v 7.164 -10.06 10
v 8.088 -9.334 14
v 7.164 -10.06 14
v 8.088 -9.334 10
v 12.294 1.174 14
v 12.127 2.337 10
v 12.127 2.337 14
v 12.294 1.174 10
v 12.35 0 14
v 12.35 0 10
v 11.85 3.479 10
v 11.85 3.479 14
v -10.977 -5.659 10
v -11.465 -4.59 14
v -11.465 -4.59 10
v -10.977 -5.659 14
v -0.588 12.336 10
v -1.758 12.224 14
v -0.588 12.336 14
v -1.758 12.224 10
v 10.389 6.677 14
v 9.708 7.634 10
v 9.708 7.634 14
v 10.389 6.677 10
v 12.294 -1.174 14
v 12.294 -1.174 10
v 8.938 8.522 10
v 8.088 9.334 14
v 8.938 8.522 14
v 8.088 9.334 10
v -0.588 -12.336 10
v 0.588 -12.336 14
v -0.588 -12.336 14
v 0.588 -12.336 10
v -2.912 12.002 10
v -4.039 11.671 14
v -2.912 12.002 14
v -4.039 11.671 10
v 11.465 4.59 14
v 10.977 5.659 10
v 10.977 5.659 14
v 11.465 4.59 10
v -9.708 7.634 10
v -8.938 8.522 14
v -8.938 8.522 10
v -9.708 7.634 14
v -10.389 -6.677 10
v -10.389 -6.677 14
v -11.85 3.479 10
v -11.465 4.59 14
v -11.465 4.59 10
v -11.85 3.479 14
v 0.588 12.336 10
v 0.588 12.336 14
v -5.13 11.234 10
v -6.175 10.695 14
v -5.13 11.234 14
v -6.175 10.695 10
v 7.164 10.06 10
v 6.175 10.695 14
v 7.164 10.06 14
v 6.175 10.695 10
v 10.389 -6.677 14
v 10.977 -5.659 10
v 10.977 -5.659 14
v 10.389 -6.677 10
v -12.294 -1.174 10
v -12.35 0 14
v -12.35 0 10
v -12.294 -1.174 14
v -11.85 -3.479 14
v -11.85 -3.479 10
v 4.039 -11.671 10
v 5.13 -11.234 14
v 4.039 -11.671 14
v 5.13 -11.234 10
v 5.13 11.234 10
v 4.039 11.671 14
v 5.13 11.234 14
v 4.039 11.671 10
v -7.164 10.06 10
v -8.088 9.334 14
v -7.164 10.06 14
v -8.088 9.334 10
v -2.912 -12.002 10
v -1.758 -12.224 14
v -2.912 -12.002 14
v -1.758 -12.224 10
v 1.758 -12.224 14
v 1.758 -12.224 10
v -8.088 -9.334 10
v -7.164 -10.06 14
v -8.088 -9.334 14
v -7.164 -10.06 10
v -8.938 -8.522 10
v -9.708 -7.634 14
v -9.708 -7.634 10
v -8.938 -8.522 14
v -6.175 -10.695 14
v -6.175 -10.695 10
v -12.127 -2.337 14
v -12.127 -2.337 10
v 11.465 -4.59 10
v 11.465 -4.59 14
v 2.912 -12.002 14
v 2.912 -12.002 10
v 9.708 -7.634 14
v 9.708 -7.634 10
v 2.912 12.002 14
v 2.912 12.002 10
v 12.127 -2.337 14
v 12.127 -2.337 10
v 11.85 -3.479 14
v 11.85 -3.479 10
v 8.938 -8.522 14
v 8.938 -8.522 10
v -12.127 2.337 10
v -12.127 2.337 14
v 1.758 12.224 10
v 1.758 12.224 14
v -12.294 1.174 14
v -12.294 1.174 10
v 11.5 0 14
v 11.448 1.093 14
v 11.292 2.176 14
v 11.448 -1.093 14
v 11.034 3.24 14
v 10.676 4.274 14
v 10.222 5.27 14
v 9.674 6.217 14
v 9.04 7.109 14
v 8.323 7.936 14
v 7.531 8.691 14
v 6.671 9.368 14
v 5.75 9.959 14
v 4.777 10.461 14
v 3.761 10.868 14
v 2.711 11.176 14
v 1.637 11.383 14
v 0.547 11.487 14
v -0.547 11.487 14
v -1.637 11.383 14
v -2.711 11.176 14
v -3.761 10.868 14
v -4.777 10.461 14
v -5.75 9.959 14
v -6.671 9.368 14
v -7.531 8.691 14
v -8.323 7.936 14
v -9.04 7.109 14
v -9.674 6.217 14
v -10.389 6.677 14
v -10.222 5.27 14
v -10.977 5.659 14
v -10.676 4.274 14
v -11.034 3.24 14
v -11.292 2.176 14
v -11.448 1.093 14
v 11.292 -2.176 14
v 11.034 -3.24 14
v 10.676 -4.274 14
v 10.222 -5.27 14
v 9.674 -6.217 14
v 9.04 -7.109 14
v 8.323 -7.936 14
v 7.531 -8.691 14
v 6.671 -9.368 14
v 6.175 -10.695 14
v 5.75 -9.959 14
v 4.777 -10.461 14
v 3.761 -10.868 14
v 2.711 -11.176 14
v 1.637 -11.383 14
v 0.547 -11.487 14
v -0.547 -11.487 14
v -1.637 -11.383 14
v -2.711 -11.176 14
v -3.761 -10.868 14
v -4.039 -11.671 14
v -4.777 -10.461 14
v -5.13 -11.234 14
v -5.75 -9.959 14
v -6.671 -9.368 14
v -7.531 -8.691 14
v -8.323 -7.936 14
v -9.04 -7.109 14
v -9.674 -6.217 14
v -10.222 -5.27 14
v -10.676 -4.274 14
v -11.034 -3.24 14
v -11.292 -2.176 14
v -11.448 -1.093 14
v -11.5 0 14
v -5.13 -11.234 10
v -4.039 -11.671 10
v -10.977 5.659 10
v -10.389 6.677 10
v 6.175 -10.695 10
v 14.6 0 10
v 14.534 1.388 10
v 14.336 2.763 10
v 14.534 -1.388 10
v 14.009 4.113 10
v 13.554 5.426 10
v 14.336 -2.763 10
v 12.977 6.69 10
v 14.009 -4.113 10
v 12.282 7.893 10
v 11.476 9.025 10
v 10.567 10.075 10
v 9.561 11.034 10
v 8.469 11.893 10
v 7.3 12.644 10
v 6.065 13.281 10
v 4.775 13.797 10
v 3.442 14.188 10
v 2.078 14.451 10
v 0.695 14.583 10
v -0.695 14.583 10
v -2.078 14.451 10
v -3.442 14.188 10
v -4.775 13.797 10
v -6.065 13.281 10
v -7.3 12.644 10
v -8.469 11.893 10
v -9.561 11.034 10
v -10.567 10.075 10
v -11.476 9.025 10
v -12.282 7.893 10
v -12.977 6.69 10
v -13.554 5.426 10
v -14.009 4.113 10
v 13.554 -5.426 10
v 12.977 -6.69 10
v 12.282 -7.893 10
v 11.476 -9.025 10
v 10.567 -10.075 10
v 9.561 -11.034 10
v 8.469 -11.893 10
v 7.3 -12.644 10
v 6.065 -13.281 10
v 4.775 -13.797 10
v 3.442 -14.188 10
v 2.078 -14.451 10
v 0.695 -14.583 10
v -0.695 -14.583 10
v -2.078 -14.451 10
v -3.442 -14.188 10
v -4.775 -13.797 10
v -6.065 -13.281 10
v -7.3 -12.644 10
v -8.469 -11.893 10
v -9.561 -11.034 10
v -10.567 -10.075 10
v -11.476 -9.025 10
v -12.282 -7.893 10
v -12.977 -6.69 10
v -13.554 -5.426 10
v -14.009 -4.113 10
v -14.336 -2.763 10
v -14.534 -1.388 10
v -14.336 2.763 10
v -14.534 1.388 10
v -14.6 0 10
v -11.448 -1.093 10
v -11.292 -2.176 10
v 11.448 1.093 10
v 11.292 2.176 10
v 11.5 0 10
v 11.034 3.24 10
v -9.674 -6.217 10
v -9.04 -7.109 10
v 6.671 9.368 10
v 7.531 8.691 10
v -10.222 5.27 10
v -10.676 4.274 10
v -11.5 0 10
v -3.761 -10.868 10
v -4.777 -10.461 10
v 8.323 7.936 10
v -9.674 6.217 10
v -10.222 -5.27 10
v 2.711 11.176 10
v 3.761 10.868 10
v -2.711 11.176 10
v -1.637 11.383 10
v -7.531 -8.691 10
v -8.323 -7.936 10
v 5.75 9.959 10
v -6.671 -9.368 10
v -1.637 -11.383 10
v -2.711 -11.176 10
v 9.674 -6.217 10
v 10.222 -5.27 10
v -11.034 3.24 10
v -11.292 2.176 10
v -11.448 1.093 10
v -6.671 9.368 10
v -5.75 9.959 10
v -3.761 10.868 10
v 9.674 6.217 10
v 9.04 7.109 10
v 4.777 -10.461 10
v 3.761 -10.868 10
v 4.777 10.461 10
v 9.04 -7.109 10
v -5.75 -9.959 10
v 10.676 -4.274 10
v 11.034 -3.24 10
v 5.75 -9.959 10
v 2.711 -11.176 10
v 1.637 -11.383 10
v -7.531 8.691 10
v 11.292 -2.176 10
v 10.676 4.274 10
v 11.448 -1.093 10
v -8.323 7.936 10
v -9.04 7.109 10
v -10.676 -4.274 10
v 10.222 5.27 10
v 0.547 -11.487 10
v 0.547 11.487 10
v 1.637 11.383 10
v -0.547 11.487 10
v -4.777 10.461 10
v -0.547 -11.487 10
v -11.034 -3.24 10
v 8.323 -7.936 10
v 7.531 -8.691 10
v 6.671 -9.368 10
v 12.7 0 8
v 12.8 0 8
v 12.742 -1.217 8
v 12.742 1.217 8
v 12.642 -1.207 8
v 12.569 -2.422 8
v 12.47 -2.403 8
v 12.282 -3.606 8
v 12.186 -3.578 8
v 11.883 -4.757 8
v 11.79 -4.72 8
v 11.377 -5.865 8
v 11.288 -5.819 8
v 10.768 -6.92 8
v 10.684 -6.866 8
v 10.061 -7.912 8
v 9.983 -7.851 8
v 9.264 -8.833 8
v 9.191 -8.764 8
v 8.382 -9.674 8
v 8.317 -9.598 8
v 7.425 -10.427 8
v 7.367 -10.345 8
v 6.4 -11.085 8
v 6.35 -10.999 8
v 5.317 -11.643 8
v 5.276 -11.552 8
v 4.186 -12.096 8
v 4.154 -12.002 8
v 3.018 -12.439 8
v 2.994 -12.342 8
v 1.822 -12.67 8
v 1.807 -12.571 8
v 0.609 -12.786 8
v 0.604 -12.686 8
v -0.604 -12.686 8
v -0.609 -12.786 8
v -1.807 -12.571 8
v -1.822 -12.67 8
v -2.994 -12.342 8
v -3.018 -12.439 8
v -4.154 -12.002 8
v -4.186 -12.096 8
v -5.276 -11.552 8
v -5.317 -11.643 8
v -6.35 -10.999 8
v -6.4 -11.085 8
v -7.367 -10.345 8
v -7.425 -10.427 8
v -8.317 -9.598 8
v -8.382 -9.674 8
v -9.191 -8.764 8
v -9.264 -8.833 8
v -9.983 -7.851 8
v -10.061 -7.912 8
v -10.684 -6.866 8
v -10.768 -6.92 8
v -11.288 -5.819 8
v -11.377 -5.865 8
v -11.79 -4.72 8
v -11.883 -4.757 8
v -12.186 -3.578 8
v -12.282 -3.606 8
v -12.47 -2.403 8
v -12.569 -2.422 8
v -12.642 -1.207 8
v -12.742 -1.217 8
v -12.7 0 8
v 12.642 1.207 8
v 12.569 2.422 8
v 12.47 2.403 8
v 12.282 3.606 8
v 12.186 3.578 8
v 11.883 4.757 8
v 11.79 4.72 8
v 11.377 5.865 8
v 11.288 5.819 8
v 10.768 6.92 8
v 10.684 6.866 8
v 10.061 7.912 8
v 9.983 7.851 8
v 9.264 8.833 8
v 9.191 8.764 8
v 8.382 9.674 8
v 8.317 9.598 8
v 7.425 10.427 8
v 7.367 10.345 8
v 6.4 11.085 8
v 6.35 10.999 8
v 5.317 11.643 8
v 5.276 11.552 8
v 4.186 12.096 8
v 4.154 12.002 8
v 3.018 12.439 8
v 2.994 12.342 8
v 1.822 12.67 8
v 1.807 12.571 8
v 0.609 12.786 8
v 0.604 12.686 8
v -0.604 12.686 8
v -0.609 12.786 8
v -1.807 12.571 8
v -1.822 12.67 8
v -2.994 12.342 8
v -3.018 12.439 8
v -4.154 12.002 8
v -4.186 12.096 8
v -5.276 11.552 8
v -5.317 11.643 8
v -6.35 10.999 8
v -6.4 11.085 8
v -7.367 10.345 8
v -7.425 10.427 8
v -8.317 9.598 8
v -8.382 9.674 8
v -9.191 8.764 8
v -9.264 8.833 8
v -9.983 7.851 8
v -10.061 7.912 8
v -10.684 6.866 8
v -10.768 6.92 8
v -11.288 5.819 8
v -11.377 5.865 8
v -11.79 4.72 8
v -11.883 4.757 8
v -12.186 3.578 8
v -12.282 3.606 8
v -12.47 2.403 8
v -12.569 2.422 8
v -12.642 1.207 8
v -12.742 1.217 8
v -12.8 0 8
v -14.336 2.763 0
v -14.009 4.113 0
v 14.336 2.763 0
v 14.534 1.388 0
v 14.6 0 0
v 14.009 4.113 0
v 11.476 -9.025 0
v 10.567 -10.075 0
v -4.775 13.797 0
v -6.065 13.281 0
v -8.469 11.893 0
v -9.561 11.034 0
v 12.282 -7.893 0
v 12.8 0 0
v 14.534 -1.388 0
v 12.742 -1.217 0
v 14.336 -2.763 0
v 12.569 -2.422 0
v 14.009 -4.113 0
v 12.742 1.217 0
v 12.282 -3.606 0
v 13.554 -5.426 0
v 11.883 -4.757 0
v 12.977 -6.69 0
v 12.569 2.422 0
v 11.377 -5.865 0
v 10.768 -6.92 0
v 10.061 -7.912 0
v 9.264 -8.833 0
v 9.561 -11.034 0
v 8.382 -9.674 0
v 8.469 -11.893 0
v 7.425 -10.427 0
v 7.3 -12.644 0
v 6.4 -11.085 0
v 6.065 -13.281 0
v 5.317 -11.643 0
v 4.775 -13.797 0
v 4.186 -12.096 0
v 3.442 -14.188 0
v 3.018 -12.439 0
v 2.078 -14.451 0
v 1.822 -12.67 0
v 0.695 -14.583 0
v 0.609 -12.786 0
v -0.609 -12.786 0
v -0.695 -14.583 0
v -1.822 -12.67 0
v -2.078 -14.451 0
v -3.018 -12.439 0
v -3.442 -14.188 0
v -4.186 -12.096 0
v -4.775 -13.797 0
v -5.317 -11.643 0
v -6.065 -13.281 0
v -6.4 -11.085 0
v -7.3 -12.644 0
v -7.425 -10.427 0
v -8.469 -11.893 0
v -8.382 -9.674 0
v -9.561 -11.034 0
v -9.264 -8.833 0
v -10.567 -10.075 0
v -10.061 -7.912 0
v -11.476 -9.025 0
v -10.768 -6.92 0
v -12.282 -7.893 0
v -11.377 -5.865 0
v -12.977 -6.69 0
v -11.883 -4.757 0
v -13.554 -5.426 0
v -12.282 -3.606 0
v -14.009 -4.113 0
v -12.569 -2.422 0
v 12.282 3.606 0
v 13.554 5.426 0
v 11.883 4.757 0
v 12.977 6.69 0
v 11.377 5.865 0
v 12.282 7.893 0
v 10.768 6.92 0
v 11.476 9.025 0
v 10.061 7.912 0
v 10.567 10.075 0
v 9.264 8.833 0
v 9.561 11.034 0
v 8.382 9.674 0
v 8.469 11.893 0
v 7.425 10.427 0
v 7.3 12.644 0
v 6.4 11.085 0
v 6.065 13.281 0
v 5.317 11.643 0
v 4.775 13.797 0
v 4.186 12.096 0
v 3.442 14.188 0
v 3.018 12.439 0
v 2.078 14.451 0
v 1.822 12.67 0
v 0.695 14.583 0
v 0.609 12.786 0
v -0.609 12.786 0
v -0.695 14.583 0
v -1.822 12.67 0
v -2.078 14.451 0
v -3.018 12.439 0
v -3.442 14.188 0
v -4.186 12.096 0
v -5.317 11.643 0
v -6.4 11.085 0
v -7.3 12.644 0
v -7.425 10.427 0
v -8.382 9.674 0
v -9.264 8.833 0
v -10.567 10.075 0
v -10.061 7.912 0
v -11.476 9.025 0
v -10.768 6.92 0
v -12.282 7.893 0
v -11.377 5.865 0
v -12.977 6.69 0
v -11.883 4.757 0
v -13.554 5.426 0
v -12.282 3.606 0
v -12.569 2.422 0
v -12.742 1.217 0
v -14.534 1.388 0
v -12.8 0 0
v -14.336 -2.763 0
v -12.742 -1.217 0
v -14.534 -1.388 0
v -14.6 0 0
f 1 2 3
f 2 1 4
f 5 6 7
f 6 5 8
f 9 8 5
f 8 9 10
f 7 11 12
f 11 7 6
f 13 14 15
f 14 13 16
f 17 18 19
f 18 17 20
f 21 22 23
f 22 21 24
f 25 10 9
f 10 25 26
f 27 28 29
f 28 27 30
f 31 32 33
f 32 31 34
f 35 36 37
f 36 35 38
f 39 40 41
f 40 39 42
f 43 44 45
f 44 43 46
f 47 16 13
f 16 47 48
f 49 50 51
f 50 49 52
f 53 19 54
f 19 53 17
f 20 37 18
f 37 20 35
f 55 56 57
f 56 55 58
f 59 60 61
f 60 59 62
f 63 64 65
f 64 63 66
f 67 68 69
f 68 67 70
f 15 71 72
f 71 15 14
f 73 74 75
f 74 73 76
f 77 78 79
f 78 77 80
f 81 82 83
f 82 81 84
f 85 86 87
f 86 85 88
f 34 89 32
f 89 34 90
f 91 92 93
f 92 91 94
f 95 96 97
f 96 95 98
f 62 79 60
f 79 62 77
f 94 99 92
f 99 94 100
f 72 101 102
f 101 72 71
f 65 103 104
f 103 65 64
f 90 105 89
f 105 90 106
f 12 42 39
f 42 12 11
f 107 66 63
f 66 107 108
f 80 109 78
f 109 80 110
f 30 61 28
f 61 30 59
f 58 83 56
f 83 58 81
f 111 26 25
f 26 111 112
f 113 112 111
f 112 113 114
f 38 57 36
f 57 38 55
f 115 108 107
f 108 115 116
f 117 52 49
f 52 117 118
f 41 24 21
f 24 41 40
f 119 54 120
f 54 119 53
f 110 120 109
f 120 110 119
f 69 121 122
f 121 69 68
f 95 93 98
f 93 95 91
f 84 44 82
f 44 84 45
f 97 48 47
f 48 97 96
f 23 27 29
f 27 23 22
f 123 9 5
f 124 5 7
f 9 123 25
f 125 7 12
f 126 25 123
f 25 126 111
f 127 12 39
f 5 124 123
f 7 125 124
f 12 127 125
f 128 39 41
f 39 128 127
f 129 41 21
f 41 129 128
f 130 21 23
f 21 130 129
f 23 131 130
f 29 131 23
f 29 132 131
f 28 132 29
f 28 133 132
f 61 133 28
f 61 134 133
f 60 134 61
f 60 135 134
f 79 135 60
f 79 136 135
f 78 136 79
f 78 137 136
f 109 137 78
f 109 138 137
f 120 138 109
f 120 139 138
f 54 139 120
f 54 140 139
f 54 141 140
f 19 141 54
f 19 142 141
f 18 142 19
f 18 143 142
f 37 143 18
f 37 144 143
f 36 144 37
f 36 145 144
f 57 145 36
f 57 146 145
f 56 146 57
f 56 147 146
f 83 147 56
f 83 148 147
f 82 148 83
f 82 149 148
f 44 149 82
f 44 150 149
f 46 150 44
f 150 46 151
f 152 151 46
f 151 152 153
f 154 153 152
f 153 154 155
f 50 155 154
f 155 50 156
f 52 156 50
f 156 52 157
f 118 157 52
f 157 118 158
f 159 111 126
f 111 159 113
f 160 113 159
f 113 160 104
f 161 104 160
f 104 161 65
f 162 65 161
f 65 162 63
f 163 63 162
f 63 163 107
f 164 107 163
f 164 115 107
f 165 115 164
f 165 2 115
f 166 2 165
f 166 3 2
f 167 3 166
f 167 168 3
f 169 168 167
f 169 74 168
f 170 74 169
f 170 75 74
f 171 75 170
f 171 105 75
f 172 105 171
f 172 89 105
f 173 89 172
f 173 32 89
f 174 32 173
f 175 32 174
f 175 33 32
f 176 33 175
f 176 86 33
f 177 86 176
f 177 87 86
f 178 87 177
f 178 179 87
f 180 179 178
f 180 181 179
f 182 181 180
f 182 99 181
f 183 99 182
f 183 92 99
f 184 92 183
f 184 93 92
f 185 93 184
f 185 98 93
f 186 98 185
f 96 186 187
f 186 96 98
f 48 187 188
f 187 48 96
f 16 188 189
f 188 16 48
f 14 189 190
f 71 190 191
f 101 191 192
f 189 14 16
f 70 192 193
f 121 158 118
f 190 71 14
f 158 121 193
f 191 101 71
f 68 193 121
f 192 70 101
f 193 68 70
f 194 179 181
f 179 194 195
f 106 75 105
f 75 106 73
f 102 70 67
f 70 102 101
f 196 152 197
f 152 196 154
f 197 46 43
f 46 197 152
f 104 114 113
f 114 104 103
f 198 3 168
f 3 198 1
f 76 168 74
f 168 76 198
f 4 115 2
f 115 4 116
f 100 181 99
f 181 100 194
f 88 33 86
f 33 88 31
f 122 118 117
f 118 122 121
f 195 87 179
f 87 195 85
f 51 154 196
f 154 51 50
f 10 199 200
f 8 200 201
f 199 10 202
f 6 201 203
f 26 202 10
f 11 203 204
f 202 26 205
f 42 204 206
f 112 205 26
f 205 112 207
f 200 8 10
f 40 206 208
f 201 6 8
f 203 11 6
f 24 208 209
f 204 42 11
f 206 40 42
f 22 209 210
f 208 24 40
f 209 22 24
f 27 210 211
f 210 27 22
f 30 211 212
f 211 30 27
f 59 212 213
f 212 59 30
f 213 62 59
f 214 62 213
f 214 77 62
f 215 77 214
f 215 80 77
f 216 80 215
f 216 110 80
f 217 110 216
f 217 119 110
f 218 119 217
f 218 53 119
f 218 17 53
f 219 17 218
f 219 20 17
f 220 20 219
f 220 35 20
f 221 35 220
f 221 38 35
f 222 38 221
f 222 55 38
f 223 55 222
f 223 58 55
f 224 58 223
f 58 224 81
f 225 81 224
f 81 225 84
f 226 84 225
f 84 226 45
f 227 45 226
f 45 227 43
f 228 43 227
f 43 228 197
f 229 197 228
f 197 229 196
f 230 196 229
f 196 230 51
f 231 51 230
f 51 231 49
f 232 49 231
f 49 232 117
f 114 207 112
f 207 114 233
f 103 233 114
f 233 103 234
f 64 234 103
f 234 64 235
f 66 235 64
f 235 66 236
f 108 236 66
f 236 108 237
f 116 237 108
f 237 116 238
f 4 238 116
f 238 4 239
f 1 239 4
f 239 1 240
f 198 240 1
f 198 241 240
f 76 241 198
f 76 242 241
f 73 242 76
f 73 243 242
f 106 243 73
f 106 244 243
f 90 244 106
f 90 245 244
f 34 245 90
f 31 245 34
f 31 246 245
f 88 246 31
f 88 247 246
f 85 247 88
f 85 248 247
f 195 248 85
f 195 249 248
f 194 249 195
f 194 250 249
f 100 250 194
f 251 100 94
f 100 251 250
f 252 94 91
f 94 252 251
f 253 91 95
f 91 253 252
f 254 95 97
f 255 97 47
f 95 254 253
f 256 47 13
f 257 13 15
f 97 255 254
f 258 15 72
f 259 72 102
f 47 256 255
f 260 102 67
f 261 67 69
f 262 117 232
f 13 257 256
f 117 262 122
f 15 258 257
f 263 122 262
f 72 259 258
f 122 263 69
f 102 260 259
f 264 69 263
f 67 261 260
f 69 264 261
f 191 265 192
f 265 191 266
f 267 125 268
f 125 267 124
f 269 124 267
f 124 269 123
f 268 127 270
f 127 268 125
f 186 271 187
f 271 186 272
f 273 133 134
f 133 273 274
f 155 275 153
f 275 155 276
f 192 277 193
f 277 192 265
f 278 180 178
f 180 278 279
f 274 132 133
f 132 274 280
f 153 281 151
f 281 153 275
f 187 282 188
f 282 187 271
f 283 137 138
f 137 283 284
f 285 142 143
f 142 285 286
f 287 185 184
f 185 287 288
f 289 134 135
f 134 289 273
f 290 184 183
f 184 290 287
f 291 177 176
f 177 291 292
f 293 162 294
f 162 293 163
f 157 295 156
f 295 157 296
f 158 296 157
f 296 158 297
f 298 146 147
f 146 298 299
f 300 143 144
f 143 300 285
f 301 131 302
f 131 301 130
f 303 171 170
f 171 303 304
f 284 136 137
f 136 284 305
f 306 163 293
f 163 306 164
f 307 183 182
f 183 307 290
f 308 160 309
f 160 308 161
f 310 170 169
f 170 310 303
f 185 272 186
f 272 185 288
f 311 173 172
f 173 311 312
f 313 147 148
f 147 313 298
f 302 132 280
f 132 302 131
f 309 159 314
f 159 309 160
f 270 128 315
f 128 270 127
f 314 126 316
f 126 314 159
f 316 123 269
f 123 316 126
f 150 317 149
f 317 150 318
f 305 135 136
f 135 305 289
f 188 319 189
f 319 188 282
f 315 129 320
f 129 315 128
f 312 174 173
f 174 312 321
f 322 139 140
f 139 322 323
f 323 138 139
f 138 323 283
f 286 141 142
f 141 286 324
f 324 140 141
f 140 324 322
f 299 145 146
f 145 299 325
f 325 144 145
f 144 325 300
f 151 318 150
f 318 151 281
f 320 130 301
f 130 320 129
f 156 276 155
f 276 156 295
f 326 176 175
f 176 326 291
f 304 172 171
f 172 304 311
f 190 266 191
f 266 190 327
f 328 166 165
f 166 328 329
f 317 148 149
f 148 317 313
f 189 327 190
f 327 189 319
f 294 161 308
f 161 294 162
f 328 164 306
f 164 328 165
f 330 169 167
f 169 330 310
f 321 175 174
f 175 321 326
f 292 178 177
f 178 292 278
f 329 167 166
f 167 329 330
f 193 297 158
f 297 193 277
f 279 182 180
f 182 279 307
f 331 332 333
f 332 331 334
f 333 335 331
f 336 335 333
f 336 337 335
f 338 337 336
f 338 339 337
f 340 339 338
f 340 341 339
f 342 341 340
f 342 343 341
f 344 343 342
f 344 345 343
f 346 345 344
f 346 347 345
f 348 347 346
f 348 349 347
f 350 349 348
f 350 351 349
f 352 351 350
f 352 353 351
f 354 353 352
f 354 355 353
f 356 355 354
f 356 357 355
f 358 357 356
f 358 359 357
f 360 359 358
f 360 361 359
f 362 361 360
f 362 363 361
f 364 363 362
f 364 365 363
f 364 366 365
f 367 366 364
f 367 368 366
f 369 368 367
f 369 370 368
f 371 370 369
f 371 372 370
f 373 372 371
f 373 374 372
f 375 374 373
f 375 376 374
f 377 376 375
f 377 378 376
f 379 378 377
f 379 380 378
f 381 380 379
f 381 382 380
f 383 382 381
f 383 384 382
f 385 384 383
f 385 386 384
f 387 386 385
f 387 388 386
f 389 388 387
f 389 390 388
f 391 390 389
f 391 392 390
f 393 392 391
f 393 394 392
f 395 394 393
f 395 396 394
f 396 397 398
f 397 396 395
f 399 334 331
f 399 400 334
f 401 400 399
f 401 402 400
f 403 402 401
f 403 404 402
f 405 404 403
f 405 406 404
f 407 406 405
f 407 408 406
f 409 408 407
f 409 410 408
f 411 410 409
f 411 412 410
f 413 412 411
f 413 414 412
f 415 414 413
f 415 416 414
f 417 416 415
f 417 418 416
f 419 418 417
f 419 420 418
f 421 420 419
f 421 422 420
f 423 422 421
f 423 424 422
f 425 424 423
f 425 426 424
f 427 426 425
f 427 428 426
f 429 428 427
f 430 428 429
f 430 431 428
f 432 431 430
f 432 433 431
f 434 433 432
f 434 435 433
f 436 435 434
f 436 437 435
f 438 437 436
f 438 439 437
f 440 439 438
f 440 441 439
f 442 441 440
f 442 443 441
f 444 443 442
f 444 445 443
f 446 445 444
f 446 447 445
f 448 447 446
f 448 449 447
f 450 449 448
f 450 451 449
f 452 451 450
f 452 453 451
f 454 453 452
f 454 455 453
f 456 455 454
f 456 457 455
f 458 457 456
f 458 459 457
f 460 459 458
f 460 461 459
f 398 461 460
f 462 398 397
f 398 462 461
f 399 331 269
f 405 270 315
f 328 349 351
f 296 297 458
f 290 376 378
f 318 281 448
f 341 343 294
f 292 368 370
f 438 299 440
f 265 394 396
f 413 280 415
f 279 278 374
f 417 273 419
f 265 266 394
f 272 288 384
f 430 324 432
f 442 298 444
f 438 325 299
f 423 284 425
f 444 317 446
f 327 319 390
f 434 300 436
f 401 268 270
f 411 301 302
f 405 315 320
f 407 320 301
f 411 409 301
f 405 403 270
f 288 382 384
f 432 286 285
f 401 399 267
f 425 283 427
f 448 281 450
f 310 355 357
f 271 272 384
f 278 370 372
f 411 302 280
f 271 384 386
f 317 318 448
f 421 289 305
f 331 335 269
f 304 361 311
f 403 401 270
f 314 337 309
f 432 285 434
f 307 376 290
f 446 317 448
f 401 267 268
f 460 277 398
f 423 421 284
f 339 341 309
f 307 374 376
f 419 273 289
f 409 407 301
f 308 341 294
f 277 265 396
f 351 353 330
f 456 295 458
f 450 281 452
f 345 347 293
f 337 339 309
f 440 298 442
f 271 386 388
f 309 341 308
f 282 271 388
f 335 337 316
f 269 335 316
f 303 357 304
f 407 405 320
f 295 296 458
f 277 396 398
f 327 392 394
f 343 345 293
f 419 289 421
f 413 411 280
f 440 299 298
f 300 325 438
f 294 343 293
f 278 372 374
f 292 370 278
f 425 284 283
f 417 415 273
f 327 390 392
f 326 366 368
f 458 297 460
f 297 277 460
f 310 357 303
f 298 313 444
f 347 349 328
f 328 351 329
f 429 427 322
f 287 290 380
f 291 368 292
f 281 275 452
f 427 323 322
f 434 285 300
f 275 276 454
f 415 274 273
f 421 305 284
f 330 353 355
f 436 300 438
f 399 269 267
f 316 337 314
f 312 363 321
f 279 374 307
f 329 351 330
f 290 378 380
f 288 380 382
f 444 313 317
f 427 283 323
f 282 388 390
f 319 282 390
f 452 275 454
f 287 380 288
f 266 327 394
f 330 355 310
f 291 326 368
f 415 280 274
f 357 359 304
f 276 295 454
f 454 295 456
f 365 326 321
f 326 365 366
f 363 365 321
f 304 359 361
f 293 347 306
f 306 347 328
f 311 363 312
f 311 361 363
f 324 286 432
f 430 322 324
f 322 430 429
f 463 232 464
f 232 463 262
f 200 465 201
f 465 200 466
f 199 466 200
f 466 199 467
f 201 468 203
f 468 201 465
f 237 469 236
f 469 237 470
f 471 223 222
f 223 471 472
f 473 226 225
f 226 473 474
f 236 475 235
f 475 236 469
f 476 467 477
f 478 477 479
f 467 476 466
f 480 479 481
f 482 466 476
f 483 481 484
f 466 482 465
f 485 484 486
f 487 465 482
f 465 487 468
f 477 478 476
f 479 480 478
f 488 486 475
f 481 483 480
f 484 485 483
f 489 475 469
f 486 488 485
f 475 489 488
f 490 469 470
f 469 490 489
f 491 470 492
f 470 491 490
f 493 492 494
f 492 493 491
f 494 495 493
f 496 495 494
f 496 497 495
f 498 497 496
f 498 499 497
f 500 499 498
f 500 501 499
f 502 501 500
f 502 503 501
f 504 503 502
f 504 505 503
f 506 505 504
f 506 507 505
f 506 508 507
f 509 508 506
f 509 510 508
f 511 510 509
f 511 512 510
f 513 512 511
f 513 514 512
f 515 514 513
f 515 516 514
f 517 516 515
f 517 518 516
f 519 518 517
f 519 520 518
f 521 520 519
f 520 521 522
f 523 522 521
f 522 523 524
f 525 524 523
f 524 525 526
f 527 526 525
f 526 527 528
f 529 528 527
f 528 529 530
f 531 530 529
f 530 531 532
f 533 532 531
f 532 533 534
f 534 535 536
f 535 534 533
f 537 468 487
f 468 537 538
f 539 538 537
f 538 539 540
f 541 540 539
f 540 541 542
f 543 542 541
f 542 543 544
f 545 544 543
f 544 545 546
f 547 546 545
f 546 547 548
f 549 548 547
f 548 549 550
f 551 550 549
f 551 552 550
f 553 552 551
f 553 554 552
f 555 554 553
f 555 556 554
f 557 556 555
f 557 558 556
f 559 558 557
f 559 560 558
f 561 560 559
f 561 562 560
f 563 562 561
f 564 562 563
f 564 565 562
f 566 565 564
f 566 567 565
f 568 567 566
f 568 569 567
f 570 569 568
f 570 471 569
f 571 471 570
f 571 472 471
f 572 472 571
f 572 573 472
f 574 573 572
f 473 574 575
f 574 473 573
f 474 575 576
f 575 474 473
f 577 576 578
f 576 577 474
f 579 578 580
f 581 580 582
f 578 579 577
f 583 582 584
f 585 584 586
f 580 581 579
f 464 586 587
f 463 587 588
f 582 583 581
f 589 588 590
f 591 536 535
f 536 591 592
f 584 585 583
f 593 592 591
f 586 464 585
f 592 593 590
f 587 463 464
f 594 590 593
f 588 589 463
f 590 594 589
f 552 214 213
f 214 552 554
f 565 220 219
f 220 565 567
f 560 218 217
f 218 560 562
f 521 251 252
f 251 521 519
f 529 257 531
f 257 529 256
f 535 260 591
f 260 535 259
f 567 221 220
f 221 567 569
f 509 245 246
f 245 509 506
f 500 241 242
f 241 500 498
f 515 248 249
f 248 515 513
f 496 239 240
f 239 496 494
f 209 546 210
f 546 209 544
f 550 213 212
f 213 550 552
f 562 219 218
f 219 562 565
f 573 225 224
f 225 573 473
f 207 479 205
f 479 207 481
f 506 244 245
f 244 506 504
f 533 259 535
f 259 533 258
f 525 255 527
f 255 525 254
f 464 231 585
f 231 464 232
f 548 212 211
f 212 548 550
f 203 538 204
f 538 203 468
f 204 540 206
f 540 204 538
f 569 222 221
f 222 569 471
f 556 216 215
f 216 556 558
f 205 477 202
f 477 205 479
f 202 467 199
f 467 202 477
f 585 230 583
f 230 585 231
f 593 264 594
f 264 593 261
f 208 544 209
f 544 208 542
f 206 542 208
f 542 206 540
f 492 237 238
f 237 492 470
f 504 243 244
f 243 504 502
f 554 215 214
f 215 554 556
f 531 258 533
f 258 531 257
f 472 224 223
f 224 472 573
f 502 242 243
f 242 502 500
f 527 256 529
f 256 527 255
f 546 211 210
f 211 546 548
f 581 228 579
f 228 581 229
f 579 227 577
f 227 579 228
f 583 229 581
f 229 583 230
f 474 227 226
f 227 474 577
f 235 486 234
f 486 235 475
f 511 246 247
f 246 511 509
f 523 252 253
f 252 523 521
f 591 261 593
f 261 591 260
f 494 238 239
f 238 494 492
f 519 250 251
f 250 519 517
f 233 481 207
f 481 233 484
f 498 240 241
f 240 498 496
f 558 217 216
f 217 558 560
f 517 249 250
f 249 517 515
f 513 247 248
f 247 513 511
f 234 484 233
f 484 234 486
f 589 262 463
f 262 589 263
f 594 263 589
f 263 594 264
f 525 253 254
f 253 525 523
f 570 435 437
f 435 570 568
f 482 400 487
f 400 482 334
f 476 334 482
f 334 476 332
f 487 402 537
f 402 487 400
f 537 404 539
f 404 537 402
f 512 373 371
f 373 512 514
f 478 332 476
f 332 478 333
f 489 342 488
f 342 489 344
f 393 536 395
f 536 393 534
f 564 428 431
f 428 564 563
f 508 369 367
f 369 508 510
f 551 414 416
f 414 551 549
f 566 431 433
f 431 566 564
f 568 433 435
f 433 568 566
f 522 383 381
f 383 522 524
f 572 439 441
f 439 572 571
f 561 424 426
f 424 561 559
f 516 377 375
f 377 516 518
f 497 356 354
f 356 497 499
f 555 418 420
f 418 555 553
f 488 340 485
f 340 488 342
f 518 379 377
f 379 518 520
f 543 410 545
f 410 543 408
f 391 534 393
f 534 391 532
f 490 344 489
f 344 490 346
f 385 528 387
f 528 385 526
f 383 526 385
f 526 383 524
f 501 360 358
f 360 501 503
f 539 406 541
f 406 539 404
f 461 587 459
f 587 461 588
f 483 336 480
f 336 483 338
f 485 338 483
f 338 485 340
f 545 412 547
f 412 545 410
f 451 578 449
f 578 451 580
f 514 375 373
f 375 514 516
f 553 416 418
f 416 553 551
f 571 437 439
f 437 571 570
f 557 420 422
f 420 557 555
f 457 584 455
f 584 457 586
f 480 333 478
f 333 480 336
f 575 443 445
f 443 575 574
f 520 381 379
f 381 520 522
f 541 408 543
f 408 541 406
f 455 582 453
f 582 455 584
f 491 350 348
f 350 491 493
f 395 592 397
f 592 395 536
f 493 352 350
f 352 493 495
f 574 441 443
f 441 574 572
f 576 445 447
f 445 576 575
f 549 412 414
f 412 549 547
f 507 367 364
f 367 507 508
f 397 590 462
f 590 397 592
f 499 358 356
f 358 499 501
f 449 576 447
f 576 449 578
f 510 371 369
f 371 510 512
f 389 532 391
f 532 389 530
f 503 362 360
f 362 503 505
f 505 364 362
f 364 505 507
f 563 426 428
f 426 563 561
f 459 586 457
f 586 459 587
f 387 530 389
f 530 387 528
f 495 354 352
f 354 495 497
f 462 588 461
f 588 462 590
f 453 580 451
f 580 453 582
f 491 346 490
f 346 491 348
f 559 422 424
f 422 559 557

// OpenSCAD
//EXTENSION TUBES
$fn = 66;
tube_len = 10; // [4:100]

//-----------------------------------------------------------------------------
// Standard: c-mount male
// @param: inner_d = 23mm (for 0.3mm resolution printer)
// @paramL outer_d = 24.7mm
//
//-----------------------------------------------------------------------------
module cmount_male(len) {
	inner_d = 23;
	outer_d = 24.7;
	f_inner_d = 25.4;
	f_outer_d = 28.6;
	translate ([0, 0, len / 2 ]) {
		difference () {
			union () {
				cylinder(r = outer_d / 2, h = len, center = true);
			}
			cylinder(r = inner_d / 2, h = len + 1, center = true);
		}

		difference () {
			translate([0, 0, -(len / 2) - 1]) cylinder(r = f_outer_d / 2, h = 2, center = true);
			translate([0, 0, -(len / 2) - 1]) cylinder(r1 = f_inner_d / 2, r2 = inner_d / 2, h = 2, center = true);
		}	
	}
}

//-----------------------------------------------------------------------------
// Standard: c-mount female
// @param: inner_d = 26mm(for 0.3mm resolution printer) //CHANGINE
// @paramL outer_d = 29.2mm 
//
//-----------------------------------------------------------------------------
module cmount_female(len) {
	inner_d = 25.6;
	outer_d = 29.2;
	translate ([0, 0, (len / 2)]) {
		difference () {
			cylinder(r = outer_d / 2, h = len, center = true);
			cylinder(r = inner_d / 2, h = len + 1, center = true);
		}	
	}

}

module extension_tube (len = 10) {
	translate([0, 0, len]) cmount_male(4);
	translate([0, 0, 0]) cmount_female(len);
}

extension_tube(tube_len);
